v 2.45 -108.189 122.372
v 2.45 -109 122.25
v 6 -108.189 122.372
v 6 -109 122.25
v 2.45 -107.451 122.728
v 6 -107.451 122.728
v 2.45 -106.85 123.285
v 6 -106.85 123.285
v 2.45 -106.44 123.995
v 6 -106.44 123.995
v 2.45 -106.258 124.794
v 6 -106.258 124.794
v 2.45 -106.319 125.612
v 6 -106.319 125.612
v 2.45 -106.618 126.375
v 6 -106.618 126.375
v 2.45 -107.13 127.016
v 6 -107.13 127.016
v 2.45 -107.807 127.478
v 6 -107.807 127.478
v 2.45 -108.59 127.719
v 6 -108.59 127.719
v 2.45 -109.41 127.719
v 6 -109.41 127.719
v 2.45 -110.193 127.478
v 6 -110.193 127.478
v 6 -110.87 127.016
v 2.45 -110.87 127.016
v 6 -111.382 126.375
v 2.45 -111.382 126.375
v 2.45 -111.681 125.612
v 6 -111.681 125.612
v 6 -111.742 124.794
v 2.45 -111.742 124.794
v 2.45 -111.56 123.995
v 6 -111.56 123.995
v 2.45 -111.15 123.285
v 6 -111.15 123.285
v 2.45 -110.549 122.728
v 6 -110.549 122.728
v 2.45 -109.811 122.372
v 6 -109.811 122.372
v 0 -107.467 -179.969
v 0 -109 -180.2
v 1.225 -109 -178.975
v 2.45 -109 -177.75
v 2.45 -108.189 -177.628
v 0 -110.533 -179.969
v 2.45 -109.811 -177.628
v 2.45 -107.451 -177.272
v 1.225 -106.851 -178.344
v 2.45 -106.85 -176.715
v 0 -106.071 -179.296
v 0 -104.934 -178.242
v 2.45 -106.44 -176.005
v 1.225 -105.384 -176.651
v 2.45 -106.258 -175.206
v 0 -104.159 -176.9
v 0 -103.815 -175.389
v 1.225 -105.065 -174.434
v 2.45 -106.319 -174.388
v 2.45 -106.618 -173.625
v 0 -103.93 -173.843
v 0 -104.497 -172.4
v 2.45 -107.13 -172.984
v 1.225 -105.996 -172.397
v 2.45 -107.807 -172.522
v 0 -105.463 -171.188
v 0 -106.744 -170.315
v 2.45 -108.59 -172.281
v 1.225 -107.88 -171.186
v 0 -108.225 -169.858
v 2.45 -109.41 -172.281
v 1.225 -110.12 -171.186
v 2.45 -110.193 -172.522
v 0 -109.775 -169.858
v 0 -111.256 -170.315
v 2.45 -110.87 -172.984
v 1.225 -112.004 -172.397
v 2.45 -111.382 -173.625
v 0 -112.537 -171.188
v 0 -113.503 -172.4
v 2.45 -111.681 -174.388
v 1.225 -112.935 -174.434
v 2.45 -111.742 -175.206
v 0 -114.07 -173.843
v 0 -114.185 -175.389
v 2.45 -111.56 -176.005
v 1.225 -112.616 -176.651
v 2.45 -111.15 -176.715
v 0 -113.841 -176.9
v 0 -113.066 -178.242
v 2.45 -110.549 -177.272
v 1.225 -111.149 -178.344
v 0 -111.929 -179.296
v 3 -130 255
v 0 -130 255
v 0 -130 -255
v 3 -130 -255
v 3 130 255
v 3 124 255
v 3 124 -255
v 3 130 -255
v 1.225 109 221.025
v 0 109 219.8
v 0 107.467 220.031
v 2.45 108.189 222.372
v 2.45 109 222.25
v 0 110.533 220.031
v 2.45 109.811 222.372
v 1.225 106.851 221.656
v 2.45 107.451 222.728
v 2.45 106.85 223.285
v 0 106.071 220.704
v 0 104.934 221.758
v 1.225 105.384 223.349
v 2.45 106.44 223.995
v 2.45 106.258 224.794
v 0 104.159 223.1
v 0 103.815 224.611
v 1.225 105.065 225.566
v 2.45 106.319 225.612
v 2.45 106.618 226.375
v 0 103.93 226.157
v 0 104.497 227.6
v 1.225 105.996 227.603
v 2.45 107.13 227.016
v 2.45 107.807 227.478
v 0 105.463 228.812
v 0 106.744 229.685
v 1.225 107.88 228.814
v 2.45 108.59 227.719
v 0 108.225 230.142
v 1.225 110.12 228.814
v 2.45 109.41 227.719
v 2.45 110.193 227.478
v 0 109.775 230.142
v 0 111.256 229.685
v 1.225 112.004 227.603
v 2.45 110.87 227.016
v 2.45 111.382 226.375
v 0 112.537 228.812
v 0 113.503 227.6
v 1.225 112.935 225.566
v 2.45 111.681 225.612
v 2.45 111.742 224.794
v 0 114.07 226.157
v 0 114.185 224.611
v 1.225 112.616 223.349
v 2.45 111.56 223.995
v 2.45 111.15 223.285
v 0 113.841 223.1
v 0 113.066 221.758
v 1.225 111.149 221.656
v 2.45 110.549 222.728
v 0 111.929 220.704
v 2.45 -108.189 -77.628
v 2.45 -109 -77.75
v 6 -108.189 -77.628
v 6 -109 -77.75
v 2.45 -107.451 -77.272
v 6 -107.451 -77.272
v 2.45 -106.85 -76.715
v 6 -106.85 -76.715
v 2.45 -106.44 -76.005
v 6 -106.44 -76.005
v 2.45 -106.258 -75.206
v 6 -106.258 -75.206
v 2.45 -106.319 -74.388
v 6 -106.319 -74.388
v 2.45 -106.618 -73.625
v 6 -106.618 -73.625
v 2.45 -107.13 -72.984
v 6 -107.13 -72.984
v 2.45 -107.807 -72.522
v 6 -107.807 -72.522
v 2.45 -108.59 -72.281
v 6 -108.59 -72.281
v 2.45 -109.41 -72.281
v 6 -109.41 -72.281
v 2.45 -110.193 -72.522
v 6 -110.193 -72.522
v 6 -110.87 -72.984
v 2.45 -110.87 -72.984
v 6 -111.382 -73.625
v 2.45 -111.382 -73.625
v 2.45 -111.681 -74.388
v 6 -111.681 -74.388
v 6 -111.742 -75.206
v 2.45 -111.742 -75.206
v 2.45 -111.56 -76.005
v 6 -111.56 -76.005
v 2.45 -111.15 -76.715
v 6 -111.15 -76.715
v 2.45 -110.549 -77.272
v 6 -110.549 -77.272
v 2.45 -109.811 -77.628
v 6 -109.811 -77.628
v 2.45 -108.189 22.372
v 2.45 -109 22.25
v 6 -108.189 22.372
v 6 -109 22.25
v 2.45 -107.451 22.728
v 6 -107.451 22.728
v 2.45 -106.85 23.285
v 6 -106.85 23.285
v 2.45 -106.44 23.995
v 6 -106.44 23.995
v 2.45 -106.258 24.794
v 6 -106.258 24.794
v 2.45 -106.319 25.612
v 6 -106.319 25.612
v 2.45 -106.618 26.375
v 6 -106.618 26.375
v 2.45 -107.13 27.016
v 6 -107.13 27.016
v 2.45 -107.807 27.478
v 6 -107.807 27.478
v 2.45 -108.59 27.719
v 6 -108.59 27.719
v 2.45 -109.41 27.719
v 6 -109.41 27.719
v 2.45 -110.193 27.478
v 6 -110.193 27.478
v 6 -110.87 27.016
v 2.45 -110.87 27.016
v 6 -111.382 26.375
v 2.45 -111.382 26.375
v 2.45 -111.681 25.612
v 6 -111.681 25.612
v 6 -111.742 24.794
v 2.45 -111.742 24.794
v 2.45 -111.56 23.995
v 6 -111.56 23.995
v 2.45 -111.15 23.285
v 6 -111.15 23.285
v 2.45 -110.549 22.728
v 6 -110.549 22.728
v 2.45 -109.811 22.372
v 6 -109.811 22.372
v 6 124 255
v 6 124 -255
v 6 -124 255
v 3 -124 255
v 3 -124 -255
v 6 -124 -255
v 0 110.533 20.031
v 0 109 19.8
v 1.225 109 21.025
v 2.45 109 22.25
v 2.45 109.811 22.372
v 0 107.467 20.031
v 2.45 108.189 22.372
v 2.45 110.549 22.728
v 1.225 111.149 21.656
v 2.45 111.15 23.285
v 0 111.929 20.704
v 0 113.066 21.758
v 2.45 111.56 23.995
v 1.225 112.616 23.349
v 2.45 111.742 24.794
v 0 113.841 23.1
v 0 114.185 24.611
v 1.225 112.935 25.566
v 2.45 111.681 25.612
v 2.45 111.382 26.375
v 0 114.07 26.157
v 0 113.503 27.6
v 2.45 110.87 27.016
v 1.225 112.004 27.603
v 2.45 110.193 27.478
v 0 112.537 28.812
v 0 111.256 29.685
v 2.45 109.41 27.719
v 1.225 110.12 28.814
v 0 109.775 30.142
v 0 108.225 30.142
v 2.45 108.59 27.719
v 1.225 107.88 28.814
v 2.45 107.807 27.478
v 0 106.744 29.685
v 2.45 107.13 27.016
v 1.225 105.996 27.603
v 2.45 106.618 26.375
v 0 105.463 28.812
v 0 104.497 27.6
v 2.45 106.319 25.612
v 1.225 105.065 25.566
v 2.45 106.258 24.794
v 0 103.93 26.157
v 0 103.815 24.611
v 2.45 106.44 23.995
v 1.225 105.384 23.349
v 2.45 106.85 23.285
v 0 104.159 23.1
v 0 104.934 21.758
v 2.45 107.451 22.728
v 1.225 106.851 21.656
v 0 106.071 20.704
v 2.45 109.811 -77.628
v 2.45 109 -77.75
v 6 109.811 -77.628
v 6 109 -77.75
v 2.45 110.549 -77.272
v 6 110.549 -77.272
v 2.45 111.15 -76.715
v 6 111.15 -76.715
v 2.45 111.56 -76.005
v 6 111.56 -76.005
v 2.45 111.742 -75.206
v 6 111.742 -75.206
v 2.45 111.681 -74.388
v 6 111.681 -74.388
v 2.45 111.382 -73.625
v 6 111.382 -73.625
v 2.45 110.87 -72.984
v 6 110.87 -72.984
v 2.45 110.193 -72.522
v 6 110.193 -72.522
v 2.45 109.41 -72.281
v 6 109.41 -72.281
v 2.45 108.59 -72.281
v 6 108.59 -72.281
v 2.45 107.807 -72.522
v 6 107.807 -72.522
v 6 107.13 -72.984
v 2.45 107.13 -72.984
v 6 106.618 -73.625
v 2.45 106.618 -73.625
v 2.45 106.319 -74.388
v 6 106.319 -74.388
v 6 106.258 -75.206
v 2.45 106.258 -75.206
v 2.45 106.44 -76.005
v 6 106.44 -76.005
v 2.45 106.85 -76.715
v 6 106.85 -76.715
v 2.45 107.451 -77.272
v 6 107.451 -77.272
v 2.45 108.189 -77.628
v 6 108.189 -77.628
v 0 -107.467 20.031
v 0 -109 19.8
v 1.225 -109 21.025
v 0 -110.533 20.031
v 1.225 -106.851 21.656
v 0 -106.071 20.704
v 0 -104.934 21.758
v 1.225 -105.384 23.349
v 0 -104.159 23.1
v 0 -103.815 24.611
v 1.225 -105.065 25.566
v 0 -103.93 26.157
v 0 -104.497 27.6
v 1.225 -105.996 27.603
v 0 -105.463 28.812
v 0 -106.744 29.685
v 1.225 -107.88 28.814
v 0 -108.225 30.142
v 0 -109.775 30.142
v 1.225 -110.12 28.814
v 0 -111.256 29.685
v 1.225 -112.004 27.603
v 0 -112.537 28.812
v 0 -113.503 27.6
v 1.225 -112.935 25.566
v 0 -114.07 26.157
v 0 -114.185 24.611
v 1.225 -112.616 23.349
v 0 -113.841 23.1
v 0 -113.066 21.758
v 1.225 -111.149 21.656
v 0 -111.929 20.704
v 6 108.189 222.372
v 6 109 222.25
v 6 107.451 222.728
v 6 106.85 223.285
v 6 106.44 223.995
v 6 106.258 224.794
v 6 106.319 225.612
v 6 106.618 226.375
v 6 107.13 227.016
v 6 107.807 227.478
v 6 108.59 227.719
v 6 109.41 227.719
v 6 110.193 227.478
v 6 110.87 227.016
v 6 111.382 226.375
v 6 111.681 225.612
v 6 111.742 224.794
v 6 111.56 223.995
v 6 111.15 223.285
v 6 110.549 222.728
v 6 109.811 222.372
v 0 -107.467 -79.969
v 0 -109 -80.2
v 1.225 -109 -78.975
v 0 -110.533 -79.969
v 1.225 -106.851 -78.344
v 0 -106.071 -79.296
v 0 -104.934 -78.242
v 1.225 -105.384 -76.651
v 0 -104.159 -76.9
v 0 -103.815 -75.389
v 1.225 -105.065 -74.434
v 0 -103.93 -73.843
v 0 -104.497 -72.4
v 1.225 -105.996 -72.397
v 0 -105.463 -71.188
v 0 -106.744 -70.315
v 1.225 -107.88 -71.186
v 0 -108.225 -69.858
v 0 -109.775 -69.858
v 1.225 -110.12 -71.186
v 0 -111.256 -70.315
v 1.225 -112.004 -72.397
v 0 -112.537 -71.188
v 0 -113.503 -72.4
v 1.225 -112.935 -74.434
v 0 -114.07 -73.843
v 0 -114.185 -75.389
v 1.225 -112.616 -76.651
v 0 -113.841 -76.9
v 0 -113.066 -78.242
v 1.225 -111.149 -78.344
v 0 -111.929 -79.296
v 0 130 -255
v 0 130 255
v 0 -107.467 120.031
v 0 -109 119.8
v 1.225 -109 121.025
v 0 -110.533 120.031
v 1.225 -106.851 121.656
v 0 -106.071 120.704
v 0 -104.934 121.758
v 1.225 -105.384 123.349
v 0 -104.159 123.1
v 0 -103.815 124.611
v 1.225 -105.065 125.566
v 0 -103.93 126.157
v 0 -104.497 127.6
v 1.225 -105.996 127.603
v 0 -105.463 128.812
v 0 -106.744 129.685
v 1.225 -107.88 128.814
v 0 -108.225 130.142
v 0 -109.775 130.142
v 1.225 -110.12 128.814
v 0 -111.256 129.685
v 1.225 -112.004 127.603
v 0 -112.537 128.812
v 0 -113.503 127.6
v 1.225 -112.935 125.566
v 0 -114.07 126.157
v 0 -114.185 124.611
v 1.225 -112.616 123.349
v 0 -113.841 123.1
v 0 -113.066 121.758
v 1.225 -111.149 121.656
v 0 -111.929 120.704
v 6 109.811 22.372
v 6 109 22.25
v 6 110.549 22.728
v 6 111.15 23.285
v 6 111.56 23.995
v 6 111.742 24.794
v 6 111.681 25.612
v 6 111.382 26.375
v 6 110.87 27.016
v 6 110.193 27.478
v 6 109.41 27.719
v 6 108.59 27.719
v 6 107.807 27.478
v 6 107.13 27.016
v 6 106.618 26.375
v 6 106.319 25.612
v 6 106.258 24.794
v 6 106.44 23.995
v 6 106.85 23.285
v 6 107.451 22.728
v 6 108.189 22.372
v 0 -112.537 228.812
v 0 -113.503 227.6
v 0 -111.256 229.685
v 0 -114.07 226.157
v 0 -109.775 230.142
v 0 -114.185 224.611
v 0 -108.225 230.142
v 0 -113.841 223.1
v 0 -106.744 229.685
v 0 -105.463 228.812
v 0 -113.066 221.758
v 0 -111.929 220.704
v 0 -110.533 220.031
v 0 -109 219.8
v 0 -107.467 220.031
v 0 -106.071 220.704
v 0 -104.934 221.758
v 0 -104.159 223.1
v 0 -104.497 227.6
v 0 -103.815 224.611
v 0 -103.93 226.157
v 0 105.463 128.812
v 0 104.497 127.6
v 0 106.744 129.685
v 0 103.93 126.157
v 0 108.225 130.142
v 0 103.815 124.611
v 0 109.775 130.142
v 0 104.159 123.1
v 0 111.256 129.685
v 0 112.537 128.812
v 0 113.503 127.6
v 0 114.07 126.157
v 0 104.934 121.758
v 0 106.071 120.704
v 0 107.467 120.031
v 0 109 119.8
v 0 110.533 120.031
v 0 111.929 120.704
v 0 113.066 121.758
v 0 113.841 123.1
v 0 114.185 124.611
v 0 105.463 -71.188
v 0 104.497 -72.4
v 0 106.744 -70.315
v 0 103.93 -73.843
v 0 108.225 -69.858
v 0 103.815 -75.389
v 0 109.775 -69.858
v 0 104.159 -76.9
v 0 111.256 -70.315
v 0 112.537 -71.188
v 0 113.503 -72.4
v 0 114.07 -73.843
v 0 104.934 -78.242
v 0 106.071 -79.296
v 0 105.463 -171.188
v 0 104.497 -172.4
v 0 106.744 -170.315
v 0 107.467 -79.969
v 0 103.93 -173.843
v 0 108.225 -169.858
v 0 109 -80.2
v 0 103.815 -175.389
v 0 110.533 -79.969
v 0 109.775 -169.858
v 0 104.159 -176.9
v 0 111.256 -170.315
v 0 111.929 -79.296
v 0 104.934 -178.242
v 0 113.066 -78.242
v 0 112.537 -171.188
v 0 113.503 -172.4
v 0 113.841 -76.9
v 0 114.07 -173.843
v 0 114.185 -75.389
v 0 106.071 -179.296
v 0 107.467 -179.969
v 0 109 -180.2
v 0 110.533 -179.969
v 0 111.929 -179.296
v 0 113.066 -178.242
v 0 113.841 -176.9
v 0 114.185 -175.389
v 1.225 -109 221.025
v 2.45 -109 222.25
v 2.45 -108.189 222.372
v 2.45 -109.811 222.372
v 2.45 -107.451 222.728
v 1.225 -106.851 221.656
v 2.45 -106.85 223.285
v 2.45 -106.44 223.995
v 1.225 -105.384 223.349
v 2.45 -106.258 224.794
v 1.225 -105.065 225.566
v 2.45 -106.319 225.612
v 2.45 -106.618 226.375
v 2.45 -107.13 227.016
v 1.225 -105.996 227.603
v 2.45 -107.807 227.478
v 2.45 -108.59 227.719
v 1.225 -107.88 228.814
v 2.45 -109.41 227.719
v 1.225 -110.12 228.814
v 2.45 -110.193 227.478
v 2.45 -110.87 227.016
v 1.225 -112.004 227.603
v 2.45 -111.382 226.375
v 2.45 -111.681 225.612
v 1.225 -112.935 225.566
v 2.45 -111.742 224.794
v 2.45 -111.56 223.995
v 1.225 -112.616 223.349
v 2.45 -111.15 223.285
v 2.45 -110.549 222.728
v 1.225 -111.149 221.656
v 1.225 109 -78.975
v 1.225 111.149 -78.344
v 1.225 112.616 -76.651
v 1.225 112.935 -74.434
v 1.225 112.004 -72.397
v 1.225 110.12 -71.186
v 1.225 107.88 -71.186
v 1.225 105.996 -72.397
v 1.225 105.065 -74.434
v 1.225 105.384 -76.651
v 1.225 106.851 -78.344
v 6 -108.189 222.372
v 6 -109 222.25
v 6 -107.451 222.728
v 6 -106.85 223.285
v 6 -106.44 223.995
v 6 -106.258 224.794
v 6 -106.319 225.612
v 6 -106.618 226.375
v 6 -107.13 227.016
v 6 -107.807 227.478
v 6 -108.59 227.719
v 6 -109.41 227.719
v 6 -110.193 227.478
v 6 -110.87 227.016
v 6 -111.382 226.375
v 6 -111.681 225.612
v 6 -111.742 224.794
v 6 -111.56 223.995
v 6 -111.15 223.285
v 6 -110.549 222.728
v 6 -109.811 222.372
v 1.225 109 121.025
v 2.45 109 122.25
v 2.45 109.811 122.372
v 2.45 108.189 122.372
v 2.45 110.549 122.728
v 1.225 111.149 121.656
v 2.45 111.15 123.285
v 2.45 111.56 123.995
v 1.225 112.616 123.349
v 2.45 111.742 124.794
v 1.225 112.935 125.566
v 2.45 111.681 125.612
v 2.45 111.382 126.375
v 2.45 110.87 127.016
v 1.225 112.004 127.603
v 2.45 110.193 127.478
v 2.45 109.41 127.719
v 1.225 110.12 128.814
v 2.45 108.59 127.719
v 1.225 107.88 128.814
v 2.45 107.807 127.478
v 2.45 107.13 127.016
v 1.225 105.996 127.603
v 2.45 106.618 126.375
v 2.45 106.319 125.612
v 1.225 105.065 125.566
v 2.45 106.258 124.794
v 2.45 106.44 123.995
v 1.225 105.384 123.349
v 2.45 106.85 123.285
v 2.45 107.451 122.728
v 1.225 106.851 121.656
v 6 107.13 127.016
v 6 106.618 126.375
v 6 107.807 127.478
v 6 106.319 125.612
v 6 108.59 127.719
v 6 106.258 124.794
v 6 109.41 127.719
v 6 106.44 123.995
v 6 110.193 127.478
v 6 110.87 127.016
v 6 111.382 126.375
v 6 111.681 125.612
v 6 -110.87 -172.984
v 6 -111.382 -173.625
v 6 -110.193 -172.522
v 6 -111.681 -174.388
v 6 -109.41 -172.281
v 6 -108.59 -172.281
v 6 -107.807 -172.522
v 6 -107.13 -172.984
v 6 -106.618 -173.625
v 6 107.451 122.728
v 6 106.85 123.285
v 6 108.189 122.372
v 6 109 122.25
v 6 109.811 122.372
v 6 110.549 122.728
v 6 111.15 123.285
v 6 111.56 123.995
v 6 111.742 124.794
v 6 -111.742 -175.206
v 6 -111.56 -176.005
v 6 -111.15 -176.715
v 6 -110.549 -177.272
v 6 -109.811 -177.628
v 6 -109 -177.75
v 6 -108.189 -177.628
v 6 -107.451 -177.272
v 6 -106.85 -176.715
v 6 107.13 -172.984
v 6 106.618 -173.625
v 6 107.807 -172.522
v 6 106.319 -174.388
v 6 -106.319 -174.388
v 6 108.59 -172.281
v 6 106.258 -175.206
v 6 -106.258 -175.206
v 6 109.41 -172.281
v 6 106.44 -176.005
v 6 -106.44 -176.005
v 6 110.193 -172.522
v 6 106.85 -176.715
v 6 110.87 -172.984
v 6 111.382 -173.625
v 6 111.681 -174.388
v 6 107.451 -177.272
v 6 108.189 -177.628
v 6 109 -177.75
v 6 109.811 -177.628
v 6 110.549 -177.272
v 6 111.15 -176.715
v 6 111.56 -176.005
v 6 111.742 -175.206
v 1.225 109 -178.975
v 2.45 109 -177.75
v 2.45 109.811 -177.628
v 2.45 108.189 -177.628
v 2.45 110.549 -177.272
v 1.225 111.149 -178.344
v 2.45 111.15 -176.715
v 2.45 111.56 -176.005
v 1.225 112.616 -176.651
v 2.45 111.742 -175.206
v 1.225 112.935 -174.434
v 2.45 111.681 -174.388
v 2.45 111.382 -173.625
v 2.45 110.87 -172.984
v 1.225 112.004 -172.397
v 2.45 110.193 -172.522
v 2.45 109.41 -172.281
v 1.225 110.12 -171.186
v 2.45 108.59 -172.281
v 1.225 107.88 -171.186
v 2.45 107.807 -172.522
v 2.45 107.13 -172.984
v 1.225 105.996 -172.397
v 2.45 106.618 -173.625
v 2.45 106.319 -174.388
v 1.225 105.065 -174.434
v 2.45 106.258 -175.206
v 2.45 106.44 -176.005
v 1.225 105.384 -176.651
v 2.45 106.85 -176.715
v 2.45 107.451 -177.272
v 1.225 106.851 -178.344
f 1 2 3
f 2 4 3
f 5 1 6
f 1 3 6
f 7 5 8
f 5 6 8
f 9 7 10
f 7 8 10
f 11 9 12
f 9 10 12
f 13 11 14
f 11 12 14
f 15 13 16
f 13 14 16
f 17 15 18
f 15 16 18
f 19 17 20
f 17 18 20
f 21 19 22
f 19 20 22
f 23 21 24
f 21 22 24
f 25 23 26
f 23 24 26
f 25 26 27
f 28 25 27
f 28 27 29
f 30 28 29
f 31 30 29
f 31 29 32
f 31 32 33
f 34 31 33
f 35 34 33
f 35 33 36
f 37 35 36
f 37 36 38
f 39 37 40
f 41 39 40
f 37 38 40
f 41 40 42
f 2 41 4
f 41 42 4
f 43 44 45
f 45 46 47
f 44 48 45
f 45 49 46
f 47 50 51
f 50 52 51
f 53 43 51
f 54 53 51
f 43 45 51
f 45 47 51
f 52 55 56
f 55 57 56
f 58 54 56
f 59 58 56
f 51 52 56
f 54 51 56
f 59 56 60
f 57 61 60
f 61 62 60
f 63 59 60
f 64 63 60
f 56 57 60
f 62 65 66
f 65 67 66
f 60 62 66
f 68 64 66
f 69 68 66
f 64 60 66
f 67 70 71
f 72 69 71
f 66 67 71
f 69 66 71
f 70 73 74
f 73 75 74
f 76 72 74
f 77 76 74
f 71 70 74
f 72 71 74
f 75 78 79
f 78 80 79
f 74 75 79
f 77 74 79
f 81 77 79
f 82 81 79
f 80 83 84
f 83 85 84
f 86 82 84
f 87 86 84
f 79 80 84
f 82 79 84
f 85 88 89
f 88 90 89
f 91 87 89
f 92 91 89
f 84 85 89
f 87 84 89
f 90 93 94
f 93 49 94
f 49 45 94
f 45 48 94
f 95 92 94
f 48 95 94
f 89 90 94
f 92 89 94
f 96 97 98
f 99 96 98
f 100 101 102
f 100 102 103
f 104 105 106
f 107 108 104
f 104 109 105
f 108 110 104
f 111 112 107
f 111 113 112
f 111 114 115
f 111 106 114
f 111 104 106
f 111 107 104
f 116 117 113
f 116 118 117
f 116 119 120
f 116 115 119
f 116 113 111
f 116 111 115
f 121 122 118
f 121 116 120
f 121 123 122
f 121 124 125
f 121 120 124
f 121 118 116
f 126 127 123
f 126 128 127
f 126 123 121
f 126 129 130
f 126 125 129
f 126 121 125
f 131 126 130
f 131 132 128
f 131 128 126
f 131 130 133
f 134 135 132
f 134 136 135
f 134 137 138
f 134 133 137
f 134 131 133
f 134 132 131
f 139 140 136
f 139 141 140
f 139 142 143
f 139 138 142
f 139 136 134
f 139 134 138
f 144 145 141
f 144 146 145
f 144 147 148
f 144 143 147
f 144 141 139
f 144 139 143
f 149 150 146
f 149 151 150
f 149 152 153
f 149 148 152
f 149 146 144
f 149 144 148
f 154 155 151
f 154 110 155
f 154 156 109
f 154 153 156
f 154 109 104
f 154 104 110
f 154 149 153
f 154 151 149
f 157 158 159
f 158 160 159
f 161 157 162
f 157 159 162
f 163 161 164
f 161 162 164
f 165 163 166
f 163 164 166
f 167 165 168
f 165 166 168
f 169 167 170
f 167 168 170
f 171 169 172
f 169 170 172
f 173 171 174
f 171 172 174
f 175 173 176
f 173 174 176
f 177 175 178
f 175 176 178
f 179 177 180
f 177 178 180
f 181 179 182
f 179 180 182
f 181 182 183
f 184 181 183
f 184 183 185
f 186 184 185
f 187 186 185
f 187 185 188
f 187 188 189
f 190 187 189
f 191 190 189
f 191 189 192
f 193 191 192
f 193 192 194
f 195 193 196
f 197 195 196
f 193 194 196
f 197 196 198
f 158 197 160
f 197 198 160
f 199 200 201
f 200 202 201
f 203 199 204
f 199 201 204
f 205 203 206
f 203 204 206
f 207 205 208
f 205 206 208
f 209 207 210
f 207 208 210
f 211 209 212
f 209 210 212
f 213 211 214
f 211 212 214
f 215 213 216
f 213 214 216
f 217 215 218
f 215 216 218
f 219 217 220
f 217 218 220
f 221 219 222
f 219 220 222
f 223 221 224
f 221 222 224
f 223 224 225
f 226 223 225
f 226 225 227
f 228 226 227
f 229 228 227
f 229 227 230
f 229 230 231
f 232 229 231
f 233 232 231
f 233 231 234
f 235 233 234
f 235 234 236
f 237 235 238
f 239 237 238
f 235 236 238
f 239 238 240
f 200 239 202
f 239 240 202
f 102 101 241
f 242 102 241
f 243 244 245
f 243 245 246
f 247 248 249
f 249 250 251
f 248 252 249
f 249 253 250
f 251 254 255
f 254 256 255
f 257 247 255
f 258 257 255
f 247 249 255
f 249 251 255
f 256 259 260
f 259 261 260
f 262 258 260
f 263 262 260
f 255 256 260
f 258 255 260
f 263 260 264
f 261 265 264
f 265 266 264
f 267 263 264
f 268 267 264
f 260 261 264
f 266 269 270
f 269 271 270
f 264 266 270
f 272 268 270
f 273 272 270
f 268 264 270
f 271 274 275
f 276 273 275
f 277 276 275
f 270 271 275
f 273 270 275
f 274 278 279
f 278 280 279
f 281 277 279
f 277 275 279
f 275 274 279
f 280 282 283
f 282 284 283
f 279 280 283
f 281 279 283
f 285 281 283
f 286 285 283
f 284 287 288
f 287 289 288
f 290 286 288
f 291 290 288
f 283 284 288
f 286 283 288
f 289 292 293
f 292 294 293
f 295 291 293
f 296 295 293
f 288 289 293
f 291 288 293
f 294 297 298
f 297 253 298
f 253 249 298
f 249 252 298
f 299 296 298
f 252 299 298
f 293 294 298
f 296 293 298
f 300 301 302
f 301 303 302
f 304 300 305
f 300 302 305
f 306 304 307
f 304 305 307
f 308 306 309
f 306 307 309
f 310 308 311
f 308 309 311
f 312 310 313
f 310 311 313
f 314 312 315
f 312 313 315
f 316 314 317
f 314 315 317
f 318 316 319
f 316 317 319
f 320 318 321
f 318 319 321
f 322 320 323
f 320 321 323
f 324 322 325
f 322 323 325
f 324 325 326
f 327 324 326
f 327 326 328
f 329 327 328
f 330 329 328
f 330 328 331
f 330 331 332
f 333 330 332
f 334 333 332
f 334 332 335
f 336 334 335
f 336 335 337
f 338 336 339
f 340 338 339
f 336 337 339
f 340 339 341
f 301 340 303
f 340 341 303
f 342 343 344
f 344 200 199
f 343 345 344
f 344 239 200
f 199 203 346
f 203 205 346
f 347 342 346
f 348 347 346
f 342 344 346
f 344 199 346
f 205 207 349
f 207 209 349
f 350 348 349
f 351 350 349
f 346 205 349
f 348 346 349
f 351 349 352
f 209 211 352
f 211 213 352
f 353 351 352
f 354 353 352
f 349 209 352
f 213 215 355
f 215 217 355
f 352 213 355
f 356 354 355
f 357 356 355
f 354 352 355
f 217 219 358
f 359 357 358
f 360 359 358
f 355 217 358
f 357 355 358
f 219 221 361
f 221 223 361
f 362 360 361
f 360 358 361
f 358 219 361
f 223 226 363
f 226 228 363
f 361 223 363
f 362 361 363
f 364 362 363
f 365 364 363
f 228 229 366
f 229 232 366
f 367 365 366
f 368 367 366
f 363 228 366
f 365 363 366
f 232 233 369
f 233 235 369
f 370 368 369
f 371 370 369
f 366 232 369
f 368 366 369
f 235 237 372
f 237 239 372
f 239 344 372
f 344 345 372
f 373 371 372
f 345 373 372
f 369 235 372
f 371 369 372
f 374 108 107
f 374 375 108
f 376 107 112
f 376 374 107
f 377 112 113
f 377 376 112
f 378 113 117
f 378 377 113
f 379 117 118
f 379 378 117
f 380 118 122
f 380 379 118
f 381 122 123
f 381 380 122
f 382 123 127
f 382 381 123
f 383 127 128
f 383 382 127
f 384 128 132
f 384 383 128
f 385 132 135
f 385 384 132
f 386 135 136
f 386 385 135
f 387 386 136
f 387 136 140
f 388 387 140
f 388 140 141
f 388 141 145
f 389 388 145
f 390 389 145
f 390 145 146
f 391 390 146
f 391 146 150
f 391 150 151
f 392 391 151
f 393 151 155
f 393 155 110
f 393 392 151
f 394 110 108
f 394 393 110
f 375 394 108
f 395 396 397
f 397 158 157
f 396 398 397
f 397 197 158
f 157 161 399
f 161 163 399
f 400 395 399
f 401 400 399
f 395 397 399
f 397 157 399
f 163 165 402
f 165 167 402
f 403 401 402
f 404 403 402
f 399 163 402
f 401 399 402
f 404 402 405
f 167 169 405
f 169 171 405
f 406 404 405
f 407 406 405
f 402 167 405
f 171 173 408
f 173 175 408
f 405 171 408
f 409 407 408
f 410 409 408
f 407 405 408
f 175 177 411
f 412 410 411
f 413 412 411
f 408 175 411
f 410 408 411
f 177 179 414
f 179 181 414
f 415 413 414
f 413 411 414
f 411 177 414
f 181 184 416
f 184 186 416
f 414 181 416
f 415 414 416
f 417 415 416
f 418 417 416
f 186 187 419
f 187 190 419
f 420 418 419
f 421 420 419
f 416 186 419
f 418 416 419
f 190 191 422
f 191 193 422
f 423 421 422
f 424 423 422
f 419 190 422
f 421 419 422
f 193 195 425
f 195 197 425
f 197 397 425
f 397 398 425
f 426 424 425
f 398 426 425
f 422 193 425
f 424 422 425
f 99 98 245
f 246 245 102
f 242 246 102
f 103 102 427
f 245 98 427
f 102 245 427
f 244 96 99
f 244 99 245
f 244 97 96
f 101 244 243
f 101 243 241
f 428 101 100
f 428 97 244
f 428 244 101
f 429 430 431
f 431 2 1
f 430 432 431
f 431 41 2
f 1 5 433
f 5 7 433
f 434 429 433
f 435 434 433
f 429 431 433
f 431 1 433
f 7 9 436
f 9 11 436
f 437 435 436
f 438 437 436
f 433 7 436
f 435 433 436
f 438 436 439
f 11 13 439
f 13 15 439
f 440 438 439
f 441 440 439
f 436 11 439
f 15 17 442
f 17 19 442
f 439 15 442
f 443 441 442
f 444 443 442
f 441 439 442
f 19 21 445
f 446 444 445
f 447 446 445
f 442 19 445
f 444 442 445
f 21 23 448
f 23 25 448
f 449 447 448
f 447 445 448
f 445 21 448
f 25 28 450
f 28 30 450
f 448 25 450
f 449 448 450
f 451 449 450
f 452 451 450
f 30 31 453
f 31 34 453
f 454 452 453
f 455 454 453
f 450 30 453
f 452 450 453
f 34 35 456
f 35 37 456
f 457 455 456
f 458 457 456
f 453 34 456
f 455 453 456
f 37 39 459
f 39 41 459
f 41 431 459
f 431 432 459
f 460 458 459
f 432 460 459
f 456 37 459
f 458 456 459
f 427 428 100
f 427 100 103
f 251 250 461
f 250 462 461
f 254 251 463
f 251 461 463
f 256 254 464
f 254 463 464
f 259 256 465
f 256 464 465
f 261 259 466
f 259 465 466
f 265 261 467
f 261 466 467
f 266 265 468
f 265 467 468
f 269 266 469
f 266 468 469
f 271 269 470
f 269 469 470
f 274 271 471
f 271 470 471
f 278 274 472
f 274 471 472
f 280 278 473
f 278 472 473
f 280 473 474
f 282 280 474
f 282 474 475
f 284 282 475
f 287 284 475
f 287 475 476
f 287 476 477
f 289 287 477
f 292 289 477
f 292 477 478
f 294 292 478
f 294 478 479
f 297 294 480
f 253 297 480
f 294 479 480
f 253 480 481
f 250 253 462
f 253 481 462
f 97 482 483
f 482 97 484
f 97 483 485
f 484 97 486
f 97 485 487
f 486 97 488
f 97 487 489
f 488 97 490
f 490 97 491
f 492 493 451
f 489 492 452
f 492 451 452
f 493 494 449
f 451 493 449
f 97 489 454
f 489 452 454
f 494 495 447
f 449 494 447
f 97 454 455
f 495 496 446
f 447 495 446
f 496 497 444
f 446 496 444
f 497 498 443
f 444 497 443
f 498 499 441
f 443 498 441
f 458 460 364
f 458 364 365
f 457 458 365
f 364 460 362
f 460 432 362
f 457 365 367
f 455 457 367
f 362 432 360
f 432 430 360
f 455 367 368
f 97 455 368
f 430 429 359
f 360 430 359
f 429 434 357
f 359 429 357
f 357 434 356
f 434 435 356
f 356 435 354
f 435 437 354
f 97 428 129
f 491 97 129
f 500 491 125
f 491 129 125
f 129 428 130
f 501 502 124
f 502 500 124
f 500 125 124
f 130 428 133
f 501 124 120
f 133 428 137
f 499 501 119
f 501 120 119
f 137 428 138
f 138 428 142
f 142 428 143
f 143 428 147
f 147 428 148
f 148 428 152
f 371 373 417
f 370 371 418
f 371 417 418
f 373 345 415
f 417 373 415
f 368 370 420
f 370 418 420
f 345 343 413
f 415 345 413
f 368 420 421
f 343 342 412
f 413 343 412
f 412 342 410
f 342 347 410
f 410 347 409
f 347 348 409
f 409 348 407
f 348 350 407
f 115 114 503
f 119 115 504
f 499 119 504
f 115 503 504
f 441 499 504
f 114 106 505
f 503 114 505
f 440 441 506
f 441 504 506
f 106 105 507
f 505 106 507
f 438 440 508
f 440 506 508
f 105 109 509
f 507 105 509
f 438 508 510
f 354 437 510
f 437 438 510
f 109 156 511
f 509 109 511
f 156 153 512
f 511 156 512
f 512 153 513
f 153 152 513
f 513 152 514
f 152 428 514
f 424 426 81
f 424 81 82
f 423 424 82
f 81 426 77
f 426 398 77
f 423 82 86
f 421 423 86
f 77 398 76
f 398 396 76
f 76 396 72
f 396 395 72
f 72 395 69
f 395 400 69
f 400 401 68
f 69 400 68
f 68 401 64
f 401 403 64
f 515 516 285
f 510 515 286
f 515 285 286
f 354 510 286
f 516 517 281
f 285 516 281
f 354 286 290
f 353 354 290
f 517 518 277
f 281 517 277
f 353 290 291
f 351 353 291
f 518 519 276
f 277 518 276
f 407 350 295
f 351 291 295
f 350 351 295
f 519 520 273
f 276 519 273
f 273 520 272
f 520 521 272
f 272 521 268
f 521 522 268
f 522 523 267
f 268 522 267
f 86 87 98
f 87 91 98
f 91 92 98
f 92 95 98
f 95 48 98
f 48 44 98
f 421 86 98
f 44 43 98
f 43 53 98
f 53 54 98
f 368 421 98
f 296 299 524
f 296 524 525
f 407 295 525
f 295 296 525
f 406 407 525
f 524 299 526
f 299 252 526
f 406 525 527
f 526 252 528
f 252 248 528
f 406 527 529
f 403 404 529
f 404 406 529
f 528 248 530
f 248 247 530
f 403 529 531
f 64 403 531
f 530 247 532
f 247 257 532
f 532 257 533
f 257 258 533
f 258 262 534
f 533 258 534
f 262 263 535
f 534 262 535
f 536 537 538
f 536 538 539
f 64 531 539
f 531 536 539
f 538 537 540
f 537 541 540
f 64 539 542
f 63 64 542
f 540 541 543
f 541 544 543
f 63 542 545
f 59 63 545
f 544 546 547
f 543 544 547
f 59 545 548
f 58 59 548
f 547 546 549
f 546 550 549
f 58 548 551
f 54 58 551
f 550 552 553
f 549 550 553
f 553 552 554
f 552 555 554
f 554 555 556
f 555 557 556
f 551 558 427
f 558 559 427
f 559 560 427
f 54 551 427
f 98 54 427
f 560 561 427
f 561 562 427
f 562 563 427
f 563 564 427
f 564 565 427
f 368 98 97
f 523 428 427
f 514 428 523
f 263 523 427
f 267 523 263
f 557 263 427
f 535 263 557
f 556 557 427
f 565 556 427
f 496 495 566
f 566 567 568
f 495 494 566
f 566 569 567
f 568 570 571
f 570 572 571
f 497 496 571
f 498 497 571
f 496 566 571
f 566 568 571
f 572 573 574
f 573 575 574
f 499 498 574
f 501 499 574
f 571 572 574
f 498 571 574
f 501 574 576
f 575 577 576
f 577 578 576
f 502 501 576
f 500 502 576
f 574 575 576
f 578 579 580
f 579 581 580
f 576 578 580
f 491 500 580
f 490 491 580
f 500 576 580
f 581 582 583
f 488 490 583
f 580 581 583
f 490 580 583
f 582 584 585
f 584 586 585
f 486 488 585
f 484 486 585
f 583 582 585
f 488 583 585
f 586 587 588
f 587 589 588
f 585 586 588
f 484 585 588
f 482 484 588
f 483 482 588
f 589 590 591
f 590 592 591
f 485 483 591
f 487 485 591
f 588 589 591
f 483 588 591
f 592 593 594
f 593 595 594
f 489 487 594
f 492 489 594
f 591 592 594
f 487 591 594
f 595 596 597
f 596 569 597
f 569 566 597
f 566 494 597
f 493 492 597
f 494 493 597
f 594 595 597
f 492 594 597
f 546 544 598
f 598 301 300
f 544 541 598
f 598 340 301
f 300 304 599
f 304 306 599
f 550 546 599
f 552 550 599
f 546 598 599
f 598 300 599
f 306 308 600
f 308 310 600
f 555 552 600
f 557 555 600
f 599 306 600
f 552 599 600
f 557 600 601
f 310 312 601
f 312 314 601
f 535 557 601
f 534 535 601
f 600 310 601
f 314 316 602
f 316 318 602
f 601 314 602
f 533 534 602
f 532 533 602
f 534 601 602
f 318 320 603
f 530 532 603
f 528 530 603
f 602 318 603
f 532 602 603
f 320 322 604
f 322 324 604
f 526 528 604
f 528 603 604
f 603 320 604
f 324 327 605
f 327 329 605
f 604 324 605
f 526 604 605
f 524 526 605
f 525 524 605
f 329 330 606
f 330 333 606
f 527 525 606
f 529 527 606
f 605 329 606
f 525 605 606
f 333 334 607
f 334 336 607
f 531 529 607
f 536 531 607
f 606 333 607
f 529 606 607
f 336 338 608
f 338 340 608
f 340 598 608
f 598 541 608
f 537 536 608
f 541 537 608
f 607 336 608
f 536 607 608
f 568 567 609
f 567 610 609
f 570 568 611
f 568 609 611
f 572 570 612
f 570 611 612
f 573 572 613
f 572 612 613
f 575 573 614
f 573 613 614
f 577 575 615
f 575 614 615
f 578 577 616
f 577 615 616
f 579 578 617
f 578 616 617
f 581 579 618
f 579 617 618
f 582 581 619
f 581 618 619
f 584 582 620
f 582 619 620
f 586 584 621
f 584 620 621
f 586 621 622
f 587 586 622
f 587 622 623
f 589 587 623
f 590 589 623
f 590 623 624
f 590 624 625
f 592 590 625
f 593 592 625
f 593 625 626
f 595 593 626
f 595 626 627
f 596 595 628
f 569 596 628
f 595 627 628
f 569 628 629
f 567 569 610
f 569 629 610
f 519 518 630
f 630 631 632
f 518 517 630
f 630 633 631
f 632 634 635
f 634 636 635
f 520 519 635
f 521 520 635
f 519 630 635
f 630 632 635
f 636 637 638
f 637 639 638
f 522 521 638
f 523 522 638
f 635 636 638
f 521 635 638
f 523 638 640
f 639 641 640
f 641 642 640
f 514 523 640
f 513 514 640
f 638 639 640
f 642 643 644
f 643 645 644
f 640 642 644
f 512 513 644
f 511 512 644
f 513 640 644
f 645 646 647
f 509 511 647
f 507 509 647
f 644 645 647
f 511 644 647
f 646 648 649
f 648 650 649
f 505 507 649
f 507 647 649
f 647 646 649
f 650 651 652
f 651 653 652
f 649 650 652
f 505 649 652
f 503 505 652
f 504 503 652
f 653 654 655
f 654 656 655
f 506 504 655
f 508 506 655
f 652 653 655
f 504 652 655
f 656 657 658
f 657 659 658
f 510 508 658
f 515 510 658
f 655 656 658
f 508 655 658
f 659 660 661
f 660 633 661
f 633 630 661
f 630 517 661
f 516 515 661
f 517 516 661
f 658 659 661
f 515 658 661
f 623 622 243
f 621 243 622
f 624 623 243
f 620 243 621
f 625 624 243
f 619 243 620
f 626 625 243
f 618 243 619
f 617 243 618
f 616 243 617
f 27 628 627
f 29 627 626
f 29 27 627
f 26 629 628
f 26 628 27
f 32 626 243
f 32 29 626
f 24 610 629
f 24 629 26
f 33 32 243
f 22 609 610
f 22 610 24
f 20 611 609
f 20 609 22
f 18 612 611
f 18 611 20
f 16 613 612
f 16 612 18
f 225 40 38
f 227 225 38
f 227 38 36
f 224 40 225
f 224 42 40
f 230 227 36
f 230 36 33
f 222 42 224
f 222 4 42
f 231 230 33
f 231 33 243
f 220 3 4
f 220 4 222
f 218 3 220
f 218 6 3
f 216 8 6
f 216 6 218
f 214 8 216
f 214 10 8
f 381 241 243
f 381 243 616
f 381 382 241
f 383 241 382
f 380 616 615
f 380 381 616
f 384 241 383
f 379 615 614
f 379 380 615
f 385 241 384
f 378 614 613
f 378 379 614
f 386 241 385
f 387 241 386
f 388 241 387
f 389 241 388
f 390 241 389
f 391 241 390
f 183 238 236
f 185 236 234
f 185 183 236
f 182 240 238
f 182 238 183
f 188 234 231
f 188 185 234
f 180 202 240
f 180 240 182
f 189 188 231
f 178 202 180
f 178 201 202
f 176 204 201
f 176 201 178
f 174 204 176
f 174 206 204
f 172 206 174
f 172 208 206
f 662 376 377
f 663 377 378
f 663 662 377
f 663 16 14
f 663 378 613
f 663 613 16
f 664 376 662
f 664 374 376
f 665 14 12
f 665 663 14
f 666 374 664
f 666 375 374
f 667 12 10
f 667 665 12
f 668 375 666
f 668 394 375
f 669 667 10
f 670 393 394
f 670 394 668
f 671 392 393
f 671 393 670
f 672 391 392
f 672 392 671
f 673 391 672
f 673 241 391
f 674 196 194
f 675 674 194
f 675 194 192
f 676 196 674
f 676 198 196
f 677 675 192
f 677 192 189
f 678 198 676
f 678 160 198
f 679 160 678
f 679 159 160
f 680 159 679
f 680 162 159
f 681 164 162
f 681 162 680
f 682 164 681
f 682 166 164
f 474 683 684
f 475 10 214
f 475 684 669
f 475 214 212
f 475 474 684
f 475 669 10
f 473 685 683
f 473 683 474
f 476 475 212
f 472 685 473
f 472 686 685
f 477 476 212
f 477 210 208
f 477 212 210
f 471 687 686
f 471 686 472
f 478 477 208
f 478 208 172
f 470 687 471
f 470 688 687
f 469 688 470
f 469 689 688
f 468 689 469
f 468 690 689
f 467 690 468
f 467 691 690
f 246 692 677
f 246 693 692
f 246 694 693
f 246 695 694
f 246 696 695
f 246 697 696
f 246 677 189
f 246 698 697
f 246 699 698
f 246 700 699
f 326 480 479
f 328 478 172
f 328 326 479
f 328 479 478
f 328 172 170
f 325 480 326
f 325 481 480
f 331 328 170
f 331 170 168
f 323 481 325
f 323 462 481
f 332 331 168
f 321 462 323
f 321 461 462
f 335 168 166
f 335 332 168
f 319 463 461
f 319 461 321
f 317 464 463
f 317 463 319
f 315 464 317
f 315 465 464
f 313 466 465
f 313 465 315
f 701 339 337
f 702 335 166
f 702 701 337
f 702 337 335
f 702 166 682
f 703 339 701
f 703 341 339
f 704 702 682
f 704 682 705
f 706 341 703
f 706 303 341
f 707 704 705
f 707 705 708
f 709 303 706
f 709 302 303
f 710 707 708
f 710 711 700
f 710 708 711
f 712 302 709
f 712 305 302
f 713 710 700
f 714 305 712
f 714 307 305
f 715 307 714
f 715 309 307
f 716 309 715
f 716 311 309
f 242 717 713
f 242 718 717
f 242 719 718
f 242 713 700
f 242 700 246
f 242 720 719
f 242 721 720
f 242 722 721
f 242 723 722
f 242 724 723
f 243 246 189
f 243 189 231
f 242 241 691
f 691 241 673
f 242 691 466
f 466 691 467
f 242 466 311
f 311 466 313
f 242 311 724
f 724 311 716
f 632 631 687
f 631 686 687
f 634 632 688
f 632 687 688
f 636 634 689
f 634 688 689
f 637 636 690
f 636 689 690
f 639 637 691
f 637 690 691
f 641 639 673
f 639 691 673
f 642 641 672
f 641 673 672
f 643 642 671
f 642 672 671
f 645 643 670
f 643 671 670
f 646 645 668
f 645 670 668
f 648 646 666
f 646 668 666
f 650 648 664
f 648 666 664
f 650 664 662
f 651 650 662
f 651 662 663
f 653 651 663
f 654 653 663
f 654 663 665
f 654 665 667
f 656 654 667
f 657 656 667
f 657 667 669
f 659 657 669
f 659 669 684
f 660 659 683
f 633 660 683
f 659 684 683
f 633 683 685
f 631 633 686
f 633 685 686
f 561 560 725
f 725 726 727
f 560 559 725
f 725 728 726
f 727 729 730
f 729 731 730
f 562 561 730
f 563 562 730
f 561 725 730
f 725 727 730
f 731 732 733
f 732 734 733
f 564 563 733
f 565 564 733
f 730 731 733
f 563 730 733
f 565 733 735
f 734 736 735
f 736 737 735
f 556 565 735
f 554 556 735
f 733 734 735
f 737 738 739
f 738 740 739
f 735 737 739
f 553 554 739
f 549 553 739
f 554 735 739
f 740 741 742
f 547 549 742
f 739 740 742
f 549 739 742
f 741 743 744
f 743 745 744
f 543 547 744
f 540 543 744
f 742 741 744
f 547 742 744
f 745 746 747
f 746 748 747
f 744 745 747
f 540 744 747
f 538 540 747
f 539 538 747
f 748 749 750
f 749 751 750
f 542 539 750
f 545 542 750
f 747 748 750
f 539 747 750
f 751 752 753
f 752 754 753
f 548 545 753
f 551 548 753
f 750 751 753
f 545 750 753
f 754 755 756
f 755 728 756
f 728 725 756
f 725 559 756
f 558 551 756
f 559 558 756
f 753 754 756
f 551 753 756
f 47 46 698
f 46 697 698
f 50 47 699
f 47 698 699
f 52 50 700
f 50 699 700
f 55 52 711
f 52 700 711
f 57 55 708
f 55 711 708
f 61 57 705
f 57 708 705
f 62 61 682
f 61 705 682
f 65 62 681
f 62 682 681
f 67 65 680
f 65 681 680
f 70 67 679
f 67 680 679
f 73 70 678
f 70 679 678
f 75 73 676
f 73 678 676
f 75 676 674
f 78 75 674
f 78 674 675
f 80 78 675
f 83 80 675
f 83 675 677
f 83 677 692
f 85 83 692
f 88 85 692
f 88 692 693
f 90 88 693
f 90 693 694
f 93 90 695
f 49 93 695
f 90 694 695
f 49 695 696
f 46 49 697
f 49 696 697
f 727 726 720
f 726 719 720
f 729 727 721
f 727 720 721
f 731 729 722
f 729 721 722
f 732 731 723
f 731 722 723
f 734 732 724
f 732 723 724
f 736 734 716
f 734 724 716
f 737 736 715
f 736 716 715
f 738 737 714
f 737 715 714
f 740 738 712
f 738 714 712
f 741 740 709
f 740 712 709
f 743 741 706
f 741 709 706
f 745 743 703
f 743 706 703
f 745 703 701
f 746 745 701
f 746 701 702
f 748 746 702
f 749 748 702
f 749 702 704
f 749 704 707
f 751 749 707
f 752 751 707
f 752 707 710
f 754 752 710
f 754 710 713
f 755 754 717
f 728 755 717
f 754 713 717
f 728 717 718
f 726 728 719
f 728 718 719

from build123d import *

# Parameters (mm, degrees)
SKETCH1_W                                            = 510
SKETCH1_H                                            = 260
BOSS_EXTRUDE1_DEPTH                                  = 6
SKIZZE2_W                                            = 3
SKIZZE2_H                                            = 6
SCHNITT_LINEAR_AUSTRAGEN1_DEPTH                      = 527.34209408
CSK_FOR_M5_COUNTERSUNK_RAISED_HEAD_SCREW_D           = 5.5
CSK_FOR_M5_COUNTERSUNK_RAISED_HEAD_SCREW_CSINK_D     = 10.4
CSK_FOR_M5_COUNTERSUNK_RAISED_HEAD_SCREW_CSINK_ANGLE = 90
LPATTERN1_COUNT                                      = 5
LPATTERN1_PITCH                                      = 100
MIRROR1_COPY_1_D                                     = 5.5
MIRROR1_COPY_1_CSINK_D                               = 10.4
MIRROR1_COPY_1_CSINK_ANGLE                           = 90
MIRROR1_COPY_2_D                                     = 5.5
MIRROR1_COPY_2_CSINK_D                               = 10.4
MIRROR1_COPY_2_CSINK_ANGLE                           = 90
MIRROR1_COPY_3_D                                     = 5.5
MIRROR1_COPY_3_CSINK_D                               = 10.4
MIRROR1_COPY_3_CSINK_ANGLE                           = 90
MIRROR1_COPY_4_D                                     = 5.5
MIRROR1_COPY_4_CSINK_D                               = 10.4
MIRROR1_COPY_4_CSINK_ANGLE                           = 90


with BuildPart() as part:
    # Sketch1 → Boss-Extrude1 (new body)
    with BuildSketch(Plane(origin=(0, 0, 0), x_dir=(0, 0, -1), z_dir=(1, 0, 0))):
        Rectangle(SKETCH1_W, SKETCH1_H)
    extrude(amount=BOSS_EXTRUDE1_DEPTH)

    # Skizze2 → Schnitt-Linear austragen1 (cut, through all)
    with BuildSketch(Plane.XY.offset(255)):
        with Locations((4.5, 127)):
            Rectangle(SKIZZE2_W, SKIZZE2_H)
        with Locations((4.5, -127)):
            Rectangle(SKIZZE2_W, SKIZZE2_H)
    extrude(amount=-SCHNITT_LINEAR_AUSTRAGEN1_DEPTH, mode=Mode.SUBTRACT)

    # CSK for M5 Countersunk Raised Head Screw1 (through all)
    with Locations(Plane.ZY):
        with Locations((225, -109)):
            csk_for_m5_countersunk_raised_head_screw = CounterSinkHole(CSK_FOR_M5_COUNTERSUNK_RAISED_HEAD_SCREW_D / 2, CSK_FOR_M5_COUNTERSUNK_RAISED_HEAD_SCREW_CSINK_D / 2, counter_sink_angle=CSK_FOR_M5_COUNTERSUNK_RAISED_HEAD_SCREW_CSINK_ANGLE)

    # LPattern1: CSK for M5 Countersunk Raised Head Screw1 ×5
    with Locations(*[(0, 0, -i * LPATTERN1_PITCH) for i in range(1, LPATTERN1_COUNT)]):
        add(csk_for_m5_countersunk_raised_head_screw, mode=Mode.SUBTRACT)

    # Mirror1: CSK for M5 Countersunk Raised Head Screw1 across plane
    add(csk_for_m5_countersunk_raised_head_screw.mirror(Plane.ZX), mode=Mode.SUBTRACT)

    # Mirror1 copy 1 (through all)
    with Locations(Plane(origin=(0, 0, -100), x_dir=(0, 0, 1), z_dir=(-1, 0, 0))):
        with Locations((225, 109)):
            CounterSinkHole(MIRROR1_COPY_1_D / 2, MIRROR1_COPY_1_CSINK_D / 2, counter_sink_angle=MIRROR1_COPY_1_CSINK_ANGLE)

    # Mirror1 copy 2 (through all)
    with Locations(Plane(origin=(0, 0, -200), x_dir=(0, 0, 1), z_dir=(-1, 0, 0))):
        with Locations((225, 109)):
            CounterSinkHole(MIRROR1_COPY_2_D / 2, MIRROR1_COPY_2_CSINK_D / 2, counter_sink_angle=MIRROR1_COPY_2_CSINK_ANGLE)

    # Mirror1 copy 3 (through all)
    with Locations(Plane(origin=(0, 0, -300), x_dir=(0, 0, 1), z_dir=(-1, 0, 0))):
        with Locations((225, 109)):
            CounterSinkHole(MIRROR1_COPY_3_D / 2, MIRROR1_COPY_3_CSINK_D / 2, counter_sink_angle=MIRROR1_COPY_3_CSINK_ANGLE)

    # Mirror1 copy 4 (through all)
    with Locations(Plane(origin=(0, 0, -400), x_dir=(0, 0, 1), z_dir=(-1, 0, 0))):
        with Locations((225, 109)):
            CounterSinkHole(MIRROR1_COPY_4_D / 2, MIRROR1_COPY_4_CSINK_D / 2, counter_sink_angle=MIRROR1_COPY_4_CSINK_ANGLE)


solid = part.part
